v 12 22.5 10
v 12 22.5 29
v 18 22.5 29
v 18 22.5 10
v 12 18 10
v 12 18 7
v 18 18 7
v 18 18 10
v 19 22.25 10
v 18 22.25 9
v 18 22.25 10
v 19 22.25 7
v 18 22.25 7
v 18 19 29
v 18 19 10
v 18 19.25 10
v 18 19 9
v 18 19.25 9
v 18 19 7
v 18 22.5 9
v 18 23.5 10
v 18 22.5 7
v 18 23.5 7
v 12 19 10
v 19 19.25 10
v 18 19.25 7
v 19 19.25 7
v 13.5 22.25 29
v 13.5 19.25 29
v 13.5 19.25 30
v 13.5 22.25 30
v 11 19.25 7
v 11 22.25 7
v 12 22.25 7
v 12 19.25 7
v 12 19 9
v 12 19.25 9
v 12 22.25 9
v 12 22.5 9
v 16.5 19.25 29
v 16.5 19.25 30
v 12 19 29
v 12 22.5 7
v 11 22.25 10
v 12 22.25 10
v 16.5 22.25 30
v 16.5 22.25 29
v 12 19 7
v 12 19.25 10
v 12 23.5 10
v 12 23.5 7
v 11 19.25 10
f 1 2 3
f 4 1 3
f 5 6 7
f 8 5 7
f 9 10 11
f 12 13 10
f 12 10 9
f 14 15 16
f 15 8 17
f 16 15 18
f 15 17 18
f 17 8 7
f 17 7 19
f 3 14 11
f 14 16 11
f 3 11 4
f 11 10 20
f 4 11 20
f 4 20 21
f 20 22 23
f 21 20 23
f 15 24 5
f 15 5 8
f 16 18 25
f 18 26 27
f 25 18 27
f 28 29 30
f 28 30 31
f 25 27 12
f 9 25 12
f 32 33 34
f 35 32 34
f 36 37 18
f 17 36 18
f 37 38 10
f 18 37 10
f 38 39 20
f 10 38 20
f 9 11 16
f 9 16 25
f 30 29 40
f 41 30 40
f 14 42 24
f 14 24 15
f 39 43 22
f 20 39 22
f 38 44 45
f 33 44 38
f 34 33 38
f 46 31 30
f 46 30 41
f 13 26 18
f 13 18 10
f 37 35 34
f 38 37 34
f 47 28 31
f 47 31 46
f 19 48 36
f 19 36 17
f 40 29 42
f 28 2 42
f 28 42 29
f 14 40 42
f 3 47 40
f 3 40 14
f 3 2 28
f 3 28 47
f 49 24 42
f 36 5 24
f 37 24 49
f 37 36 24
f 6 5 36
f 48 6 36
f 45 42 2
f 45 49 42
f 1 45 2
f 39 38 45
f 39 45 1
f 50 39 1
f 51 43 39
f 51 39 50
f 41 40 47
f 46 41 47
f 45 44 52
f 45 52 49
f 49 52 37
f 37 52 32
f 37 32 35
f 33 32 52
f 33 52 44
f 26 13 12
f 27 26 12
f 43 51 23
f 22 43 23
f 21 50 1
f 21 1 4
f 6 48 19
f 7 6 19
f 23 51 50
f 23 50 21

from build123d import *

# Parameters (mm, degrees)
BOX013_W     = 3
BOX013_H     = 3
BOX013_DEPTH = 10
BOX009_W     = 1
BOX009_H     = 3
BOX009_DEPTH = 3
BOX010_W     = 1
BOX010_H     = 3
BOX010_DEPTH = 3
BOX011_W     = 6
BOX011_H     = 1
BOX011_DEPTH = 3
BOX012_W     = 6
BOX012_H     = 1
BOX012_DEPTH = 3
BOX008_W     = 6
BOX008_H     = 3.5
BOX008_DEPTH = 20


with BuildPart() as box013:
    # Box013 → Box013 (new body)
    with BuildSketch(Plane(origin=(13.5, 19.25, 20), x_dir=(1, 0, 0), z_dir=(0, 0, 1))):
        with Locations((1.5, 1.5)):
            Rectangle(BOX013_W, BOX013_H)
    extrude(amount=BOX013_DEPTH)


with BuildPart() as box009:
    # Box009 → Box009 (new body)
    with BuildSketch(Plane(origin=(11, 7.25, 7), x_dir=(1, 0, 0), z_dir=(0, 0, 1))):
        with Locations((0.5, 1.5)):
            Rectangle(BOX009_W, BOX009_H)
    extrude(amount=BOX009_DEPTH)


with BuildPart() as box010:
    # Box010 → Box010 (new body)
    with BuildSketch(Plane(origin=(18, 7.25, 7), x_dir=(1, 0, 0), z_dir=(0, 0, 1))):
        with Locations((0.5, 1.5)):
            Rectangle(BOX010_W, BOX010_H)
    extrude(amount=BOX010_DEPTH)


with BuildPart() as box011:
    # Box011 → Box011 (new body)
    with BuildSketch(Plane(origin=(12, 6, 7), x_dir=(1, 0, 0), z_dir=(0, 0, 1))):
        with Locations((3, 0.5)):
            Rectangle(BOX011_W, BOX011_H)
    extrude(amount=BOX011_DEPTH)


with BuildPart() as box012:
    # Box012 → Box012 (new body)
    with BuildSketch(Plane(origin=(12, 10.5, 7), x_dir=(1, 0, 0), z_dir=(0, 0, 1))):
        with Locations((3, 0.5)):
            Rectangle(BOX012_W, BOX012_H)
    extrude(amount=BOX012_DEPTH)


with BuildPart() as bt_ex2:
    # Box008 → Box008 (new body)
    with BuildSketch(Plane(origin=(12, 7, 9), x_dir=(1, 0, 0), z_dir=(0, 0, 1))):
        with Locations((3, 1.75)):
            Rectangle(BOX008_W, BOX008_H)
    extrude(amount=BOX008_DEPTH)

    # Fusion001: union Box009, Box010, Box011, Box012
    add(box009.part)
    add(box010.part)
    add(box011.part)
    add(box012.part)


with BuildPart() as bt_ex2_1:
    # Fusion001 placement: moved
    add(bt_ex2.part.moved(Location((0, 12, 0))))

    # Fusion006: union Box013
    add(box013.part)


solid = bt_ex2_1.part
